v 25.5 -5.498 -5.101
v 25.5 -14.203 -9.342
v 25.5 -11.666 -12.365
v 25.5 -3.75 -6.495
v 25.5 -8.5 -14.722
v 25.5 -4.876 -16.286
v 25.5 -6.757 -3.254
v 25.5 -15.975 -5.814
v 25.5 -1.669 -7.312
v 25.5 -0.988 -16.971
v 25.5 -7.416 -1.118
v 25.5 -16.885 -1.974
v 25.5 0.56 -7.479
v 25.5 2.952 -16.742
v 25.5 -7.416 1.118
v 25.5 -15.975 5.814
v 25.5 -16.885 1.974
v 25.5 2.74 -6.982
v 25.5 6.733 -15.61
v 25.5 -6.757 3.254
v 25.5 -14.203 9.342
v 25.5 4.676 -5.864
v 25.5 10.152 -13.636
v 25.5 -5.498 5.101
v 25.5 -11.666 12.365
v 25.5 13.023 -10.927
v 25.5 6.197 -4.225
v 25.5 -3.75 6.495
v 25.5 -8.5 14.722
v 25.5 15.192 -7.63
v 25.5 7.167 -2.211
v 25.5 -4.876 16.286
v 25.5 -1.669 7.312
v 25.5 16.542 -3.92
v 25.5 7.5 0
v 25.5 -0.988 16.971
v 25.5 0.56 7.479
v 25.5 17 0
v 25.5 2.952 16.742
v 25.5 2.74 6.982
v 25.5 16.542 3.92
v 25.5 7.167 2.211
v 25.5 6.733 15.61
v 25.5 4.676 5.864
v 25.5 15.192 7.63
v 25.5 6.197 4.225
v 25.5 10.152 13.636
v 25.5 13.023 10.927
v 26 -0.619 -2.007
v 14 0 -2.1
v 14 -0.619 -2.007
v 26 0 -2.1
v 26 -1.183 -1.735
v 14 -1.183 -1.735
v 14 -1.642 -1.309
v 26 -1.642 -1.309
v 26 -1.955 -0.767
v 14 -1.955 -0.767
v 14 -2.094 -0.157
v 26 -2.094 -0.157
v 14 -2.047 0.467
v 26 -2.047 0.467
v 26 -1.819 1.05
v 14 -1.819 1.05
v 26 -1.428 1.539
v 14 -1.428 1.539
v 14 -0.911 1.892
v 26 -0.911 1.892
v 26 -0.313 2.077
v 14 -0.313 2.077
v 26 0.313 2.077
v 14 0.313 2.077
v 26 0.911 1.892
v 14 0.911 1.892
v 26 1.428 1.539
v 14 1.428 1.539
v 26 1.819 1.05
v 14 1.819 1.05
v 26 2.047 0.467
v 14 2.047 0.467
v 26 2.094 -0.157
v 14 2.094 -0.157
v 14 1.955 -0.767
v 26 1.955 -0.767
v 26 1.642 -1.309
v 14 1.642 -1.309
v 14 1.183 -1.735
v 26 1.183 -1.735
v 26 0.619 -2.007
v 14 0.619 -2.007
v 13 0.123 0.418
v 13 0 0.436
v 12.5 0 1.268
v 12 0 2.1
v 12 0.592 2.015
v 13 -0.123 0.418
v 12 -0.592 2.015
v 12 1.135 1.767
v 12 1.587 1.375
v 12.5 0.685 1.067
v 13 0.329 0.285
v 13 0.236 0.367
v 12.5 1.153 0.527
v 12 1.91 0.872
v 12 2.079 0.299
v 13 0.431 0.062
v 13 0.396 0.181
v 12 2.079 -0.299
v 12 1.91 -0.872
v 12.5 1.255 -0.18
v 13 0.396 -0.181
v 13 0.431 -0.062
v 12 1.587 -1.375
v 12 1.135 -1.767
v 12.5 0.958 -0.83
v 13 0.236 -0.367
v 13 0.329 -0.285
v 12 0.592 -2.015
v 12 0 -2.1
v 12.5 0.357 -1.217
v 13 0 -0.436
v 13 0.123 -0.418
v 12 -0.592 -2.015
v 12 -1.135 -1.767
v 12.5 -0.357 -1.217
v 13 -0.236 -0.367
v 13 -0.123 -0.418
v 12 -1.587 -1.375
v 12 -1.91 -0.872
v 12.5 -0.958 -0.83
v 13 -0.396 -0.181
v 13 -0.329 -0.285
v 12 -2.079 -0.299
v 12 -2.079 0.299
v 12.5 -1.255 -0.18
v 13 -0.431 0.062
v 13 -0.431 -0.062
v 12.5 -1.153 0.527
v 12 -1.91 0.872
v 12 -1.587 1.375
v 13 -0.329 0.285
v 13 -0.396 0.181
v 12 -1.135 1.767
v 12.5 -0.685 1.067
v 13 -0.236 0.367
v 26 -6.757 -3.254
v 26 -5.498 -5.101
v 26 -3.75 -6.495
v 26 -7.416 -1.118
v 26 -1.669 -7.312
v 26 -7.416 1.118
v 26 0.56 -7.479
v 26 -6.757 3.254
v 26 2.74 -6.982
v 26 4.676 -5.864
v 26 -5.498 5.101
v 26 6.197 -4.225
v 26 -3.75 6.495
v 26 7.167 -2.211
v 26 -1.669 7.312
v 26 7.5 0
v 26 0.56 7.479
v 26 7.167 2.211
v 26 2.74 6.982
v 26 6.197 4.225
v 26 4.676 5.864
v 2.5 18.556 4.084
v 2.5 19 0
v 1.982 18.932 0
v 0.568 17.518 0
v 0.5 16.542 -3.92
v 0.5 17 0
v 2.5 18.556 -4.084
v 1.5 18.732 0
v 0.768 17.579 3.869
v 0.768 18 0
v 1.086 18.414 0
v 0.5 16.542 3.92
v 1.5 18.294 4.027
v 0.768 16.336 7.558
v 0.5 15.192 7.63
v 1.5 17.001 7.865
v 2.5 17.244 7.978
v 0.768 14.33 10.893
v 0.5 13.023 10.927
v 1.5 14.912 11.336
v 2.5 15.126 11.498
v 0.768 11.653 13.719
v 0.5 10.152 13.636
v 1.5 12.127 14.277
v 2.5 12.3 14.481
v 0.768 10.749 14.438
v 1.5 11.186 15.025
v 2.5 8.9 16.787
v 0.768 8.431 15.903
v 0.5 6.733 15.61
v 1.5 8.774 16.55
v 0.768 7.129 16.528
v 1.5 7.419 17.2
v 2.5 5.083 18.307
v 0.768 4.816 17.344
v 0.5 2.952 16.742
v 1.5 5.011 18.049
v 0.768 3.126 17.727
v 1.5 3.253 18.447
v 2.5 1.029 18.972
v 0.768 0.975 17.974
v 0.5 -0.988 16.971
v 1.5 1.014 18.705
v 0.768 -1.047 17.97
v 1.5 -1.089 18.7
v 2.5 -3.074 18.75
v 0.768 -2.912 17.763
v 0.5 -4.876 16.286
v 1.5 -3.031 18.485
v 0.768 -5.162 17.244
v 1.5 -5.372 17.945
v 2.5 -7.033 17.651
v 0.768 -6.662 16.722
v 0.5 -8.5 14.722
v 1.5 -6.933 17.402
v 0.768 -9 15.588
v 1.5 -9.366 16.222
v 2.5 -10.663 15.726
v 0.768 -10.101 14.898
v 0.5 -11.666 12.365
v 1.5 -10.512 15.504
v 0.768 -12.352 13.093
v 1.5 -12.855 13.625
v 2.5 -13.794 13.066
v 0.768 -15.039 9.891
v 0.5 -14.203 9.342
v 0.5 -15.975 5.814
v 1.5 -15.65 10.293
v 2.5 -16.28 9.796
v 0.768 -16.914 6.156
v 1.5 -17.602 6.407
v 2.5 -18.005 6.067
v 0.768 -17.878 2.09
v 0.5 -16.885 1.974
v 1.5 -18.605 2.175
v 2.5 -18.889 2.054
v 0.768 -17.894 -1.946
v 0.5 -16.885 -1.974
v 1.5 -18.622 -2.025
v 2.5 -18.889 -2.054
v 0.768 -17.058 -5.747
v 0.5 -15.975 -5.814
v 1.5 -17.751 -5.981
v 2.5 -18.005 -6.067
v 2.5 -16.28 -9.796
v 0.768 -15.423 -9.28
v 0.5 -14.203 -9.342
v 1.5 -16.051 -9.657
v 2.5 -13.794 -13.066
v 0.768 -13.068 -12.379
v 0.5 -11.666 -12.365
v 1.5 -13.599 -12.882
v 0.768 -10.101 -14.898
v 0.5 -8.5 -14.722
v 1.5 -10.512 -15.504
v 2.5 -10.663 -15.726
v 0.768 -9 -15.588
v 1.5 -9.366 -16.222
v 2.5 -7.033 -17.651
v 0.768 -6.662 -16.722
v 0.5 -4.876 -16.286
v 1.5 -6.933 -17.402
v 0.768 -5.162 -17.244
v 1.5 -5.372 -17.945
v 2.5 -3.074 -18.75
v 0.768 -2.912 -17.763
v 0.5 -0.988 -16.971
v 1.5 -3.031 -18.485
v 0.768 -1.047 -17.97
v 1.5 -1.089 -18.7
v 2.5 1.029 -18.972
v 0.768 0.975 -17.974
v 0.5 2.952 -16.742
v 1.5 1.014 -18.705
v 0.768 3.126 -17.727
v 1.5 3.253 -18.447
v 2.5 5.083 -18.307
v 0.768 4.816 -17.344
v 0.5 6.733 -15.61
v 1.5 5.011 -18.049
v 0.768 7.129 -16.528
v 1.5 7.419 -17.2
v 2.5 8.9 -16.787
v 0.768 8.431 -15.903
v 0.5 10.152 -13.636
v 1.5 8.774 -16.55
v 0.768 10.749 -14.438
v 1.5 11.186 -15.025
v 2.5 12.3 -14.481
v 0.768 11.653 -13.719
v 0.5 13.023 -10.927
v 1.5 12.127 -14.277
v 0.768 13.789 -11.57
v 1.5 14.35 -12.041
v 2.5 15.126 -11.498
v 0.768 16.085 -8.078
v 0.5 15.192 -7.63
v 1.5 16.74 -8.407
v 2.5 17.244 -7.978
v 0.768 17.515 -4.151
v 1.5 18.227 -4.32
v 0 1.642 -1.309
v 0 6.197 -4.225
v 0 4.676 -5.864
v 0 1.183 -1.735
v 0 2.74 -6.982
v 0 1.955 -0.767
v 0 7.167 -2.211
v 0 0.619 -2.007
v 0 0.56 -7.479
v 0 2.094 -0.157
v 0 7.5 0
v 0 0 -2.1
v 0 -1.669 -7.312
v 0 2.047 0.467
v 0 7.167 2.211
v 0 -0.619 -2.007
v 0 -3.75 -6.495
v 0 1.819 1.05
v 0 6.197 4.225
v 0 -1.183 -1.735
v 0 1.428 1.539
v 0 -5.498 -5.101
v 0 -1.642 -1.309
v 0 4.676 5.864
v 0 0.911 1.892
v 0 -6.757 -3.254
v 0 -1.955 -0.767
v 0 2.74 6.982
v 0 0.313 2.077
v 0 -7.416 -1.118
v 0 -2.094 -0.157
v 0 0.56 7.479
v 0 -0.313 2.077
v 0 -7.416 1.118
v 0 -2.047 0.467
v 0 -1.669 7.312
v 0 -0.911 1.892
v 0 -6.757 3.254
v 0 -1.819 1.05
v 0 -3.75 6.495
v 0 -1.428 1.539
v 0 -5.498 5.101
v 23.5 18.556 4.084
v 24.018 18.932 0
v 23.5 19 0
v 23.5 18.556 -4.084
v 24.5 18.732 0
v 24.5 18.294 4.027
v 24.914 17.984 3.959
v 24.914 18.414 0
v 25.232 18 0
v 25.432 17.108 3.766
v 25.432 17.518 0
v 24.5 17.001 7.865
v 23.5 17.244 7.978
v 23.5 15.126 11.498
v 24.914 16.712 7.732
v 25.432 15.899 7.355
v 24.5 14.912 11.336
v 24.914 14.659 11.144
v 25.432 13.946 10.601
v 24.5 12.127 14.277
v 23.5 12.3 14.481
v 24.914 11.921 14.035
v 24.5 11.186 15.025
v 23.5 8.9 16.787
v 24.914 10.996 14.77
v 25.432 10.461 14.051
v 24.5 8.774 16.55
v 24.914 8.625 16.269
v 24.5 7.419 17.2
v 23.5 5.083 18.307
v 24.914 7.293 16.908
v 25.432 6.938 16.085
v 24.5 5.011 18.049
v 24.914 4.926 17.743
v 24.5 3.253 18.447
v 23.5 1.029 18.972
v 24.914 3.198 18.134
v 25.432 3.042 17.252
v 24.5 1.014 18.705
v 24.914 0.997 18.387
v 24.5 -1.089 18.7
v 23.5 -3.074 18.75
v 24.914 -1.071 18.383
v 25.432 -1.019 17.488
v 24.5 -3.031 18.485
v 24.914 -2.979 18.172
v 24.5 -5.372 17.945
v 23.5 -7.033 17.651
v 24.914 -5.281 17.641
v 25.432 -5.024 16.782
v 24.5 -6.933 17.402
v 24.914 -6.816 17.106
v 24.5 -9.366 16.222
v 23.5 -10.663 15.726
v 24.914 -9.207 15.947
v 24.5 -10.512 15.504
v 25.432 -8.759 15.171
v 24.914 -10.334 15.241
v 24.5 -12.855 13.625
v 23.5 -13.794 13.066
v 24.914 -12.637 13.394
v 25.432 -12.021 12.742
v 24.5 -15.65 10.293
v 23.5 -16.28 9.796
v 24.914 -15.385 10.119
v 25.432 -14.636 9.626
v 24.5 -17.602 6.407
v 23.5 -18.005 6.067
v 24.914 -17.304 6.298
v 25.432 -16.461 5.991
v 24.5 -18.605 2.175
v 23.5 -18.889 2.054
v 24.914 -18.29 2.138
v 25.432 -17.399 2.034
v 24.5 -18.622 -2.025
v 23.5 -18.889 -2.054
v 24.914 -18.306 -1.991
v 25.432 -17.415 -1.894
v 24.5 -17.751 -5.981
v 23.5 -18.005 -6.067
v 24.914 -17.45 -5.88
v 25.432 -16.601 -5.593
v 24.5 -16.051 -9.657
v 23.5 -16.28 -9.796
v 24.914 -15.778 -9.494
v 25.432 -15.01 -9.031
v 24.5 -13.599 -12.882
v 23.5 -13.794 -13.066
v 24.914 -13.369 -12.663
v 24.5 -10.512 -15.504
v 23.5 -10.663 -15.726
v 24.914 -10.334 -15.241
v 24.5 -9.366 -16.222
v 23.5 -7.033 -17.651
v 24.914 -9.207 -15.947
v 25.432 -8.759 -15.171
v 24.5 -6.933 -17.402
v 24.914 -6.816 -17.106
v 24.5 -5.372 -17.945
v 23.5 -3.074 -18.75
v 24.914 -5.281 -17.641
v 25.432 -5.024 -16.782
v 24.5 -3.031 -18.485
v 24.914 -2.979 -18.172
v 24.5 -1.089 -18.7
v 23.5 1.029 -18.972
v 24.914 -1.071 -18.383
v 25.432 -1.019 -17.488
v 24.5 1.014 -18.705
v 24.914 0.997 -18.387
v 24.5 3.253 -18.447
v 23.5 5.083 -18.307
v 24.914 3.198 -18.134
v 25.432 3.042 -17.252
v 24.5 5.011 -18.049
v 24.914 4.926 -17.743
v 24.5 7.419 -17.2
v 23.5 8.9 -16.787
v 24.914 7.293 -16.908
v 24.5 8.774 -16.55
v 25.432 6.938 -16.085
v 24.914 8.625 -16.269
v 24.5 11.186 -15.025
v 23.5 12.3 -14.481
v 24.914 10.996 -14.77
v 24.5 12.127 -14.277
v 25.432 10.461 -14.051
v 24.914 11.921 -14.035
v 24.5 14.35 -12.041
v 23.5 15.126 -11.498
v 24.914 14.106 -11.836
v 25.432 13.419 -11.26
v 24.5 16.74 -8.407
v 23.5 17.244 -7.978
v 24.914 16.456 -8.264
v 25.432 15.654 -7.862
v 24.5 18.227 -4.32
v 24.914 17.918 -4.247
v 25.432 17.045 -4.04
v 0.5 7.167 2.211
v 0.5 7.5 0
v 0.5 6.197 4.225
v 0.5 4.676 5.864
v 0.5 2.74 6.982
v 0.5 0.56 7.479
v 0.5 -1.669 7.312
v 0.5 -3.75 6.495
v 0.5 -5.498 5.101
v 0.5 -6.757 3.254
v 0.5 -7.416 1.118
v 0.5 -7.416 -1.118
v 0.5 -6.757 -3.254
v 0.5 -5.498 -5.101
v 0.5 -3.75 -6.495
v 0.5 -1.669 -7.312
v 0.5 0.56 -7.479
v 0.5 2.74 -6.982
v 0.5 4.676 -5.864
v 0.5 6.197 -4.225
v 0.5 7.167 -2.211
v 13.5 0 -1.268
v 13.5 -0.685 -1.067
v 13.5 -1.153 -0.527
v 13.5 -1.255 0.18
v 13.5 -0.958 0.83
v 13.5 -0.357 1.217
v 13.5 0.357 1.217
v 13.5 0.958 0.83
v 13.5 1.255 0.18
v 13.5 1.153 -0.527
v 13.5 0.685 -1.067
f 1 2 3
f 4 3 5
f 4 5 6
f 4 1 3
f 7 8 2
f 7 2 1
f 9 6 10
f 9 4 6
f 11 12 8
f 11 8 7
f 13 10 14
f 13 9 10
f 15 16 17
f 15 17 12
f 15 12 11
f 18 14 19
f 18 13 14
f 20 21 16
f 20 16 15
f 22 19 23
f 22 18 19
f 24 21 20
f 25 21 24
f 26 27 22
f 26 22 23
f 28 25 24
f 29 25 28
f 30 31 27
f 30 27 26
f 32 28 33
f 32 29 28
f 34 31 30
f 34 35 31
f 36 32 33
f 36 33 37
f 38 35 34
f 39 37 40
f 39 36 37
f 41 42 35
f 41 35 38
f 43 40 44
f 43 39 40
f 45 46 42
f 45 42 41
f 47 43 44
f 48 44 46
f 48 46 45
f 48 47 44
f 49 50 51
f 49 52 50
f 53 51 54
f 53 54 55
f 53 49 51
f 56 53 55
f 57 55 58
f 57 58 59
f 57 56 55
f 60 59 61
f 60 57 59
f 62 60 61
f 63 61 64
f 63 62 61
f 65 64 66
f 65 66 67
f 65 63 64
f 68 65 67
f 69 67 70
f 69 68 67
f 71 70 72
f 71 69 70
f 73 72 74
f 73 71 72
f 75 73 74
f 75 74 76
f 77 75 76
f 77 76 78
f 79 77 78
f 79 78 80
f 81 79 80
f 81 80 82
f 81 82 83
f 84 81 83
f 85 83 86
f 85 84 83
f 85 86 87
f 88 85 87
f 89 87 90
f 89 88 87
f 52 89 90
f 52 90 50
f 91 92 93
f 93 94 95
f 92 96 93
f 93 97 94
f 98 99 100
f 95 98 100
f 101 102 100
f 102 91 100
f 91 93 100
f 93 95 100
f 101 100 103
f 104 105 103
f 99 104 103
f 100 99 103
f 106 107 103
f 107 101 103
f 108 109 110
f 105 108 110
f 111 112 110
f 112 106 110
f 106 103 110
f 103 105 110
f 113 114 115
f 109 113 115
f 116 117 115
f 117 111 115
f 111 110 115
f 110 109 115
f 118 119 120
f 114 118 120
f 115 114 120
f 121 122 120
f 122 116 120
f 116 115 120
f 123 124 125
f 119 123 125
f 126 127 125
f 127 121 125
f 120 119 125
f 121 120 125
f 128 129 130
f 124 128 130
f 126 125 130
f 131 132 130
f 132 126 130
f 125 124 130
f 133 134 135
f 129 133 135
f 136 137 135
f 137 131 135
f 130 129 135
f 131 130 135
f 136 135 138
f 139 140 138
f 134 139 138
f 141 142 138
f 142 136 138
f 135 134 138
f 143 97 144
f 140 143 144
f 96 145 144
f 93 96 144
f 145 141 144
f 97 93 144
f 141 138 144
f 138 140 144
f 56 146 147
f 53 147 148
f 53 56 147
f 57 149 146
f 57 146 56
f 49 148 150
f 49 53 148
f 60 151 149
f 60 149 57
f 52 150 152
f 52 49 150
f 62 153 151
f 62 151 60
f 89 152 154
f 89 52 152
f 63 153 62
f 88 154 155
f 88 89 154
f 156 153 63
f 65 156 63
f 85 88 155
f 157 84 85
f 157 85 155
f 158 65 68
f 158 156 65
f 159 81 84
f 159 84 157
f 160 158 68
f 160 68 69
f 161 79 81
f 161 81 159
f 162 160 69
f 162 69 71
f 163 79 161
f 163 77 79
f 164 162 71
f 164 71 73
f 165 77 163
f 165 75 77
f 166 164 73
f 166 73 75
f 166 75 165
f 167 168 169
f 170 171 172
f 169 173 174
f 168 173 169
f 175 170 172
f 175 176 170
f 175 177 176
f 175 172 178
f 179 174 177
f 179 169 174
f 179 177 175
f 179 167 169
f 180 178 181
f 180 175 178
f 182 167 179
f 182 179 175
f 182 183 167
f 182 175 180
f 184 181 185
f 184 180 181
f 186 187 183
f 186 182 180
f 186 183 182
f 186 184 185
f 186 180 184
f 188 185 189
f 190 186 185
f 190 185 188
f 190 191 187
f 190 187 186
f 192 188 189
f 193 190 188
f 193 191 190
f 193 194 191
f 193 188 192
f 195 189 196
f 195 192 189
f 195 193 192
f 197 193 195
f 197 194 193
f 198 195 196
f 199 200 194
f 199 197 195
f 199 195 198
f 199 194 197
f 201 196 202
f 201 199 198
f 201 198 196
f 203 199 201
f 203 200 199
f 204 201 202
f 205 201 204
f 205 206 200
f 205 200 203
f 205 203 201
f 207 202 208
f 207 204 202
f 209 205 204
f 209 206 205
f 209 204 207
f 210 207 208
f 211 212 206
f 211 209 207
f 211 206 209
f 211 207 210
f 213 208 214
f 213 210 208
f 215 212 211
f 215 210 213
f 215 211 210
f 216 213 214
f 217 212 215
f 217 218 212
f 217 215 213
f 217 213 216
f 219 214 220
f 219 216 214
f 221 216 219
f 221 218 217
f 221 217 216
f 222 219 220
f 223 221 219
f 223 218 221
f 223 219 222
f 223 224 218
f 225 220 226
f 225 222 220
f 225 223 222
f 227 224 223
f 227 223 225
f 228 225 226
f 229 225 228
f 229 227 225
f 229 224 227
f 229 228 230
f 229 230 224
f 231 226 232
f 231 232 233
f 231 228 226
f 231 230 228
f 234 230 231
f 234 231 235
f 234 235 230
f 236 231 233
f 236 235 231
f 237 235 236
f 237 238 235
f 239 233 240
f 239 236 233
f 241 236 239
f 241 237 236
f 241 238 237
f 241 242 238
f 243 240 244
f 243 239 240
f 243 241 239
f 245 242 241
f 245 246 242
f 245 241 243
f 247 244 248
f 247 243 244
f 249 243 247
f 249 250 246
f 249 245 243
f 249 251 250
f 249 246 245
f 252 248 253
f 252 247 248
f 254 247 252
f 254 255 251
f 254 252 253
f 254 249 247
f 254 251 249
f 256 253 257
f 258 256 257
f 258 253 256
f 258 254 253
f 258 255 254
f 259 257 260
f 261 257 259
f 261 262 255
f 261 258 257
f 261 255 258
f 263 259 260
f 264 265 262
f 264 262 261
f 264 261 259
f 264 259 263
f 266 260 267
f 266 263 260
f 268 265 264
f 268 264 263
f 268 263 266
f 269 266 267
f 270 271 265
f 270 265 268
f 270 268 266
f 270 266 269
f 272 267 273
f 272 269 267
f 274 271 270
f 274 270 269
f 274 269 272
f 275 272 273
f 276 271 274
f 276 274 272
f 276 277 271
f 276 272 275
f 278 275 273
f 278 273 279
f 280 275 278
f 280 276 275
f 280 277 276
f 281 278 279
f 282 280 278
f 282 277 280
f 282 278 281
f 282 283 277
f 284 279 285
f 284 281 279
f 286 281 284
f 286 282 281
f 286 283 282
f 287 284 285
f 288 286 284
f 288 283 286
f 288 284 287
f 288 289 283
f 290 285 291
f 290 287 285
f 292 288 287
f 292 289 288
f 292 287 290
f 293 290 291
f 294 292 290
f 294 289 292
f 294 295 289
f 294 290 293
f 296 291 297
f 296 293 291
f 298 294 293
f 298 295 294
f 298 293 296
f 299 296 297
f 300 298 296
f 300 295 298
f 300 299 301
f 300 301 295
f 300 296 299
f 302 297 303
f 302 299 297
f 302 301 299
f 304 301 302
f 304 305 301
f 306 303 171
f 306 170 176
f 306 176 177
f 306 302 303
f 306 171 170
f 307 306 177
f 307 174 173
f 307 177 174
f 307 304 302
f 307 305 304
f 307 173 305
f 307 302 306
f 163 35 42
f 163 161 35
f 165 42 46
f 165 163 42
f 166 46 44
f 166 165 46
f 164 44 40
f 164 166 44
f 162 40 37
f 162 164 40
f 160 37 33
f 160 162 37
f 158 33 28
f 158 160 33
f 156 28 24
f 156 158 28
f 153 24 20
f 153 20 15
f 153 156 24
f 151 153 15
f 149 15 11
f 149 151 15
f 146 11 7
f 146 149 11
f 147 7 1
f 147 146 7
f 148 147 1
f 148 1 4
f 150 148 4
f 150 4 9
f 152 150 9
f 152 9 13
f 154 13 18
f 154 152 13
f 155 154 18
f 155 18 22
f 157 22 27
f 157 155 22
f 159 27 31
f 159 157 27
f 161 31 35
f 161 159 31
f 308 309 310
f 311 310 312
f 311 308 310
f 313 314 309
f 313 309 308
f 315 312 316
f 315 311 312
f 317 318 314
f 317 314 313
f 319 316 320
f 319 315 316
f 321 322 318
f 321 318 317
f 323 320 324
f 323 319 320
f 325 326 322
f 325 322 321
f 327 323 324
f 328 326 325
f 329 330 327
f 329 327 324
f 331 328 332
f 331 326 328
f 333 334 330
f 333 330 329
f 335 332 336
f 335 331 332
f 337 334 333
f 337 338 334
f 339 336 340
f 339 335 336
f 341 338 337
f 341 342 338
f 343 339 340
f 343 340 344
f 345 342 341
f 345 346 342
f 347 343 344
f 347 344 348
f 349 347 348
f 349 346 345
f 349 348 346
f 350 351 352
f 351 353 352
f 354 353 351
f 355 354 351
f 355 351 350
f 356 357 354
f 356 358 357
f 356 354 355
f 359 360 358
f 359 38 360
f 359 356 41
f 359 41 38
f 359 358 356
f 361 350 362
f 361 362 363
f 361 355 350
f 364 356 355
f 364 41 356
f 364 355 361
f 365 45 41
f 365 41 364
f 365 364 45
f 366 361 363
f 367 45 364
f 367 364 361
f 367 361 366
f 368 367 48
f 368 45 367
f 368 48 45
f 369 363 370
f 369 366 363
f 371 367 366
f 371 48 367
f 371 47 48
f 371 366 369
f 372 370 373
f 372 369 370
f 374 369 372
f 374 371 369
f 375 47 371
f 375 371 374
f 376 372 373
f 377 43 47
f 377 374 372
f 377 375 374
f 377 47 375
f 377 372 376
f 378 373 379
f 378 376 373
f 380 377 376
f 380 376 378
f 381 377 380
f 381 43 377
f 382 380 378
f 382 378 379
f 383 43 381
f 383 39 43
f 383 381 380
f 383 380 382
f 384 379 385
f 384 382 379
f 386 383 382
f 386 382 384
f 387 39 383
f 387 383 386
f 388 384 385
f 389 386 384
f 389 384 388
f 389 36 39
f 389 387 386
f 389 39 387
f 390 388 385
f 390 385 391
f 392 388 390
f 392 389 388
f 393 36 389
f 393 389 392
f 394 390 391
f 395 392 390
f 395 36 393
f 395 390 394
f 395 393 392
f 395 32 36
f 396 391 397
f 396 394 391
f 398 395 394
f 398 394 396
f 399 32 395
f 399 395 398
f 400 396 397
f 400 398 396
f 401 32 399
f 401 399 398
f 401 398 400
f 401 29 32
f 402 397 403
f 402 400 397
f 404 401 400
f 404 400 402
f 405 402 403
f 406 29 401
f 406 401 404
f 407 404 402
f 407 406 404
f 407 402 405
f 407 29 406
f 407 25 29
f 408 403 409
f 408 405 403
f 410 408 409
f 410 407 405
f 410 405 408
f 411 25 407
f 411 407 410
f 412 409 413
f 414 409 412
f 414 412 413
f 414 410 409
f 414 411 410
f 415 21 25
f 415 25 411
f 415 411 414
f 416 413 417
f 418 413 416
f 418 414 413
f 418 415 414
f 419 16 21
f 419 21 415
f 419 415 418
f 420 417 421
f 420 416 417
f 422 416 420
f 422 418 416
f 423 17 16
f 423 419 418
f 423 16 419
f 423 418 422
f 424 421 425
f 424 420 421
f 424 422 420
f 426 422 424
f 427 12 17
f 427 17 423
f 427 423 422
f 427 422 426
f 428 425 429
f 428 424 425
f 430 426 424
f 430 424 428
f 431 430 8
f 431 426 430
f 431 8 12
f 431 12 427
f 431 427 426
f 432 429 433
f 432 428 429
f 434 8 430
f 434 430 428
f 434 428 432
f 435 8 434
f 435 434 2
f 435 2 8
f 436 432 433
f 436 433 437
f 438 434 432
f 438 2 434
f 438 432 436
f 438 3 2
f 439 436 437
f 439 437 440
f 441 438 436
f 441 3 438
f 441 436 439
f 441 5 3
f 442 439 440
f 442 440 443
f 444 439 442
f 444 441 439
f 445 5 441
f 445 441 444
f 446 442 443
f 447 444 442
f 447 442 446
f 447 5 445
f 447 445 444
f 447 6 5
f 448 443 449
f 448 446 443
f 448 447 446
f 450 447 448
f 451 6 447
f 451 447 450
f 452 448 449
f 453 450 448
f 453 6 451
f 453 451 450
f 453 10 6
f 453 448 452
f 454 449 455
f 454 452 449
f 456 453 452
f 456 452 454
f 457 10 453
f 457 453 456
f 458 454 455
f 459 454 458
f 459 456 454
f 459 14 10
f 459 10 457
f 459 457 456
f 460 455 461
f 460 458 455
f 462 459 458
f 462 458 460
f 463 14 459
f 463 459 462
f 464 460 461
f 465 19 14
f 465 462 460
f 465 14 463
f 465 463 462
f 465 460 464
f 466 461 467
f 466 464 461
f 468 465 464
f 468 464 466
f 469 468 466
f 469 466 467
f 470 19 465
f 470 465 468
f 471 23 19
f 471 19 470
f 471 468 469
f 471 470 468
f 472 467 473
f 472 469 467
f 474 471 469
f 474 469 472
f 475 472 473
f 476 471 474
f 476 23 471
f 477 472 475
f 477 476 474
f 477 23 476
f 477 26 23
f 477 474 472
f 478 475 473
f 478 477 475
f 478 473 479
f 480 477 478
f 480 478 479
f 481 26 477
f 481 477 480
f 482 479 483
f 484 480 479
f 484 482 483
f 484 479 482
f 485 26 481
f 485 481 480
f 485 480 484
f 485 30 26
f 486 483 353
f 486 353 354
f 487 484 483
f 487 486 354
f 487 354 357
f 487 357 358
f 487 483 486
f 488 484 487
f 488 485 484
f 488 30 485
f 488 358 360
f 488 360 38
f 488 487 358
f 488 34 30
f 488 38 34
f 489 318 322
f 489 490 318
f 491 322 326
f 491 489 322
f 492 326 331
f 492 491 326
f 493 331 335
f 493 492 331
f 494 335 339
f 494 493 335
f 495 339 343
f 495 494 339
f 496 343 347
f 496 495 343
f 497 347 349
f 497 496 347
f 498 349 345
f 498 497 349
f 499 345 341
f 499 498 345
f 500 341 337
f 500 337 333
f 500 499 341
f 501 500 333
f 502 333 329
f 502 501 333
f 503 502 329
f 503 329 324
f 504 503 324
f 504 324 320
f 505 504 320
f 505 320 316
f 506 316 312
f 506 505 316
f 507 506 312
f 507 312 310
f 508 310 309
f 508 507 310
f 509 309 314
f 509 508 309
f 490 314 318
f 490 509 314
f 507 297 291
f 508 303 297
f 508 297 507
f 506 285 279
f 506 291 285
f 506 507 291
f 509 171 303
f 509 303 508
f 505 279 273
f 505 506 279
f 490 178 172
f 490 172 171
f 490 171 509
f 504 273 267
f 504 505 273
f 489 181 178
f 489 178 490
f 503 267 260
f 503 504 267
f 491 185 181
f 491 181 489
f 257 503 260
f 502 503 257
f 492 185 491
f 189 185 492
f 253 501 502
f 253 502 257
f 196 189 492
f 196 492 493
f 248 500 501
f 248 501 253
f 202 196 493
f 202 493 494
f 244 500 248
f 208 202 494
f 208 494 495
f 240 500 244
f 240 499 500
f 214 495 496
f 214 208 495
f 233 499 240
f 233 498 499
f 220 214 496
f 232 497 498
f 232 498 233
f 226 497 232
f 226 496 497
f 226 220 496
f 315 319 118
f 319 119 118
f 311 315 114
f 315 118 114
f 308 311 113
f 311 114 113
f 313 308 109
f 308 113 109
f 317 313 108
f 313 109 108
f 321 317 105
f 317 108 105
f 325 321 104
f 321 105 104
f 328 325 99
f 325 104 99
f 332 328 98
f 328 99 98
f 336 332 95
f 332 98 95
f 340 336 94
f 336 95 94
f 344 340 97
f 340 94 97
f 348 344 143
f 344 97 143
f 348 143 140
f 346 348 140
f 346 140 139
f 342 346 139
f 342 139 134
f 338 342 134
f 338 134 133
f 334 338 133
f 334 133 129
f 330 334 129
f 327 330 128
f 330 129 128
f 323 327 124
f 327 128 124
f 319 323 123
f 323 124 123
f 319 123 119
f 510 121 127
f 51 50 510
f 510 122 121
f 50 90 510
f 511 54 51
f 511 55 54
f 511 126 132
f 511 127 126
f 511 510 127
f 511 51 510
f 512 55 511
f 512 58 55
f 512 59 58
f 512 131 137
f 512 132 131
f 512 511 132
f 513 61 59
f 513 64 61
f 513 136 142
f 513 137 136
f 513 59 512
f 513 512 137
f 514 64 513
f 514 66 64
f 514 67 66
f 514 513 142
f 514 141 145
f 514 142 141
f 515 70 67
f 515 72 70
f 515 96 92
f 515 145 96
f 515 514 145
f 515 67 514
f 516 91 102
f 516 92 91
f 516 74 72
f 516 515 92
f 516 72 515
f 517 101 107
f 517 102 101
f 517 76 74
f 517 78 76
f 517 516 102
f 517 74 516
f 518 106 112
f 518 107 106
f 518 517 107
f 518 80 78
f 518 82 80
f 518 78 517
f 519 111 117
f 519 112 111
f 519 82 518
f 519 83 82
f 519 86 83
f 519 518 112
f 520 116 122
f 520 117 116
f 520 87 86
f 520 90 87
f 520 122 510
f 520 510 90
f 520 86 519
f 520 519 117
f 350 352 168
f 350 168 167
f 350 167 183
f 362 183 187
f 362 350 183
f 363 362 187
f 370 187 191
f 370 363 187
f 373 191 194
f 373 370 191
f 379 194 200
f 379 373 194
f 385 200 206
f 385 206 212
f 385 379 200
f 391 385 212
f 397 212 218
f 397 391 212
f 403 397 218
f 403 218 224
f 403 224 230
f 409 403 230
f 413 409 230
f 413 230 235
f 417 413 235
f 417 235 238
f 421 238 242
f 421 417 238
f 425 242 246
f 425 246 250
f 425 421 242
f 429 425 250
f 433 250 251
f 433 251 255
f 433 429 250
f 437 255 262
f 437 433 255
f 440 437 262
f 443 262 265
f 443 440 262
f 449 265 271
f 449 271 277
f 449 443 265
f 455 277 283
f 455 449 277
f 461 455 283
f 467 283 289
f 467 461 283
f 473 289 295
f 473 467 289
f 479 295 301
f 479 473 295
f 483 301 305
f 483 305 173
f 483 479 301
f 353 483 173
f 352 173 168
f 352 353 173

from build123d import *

# Parameters (mm, degrees)
M5_GEWINDEBOHRUNG2_D     = 4.2
M5_GEWINDEBOHRUNG2_DEPTH = 12
M5_GEWINDEBOHRUNG2_TIP   = 1.2618073
VERRUNDUNG1_R            = 2


with BuildPart() as part:
    # Skizze1 → Rotation1 (revolve)
    with BuildSketch(Plane.XY):
        Polygon((0, 0), (0, 7.5), (0.5, 7.5), (0.5, 19), (25.5, 19), (25.5, 7.5), (26, 7.5), (26, 0), align=None)
    revolve(axis=Axis((0, 0, 0), (1, 0, 0)))

    # Skizze2 → M5 Gewindebohrung1 (revolve, cut)
    with BuildSketch(Plane(origin=(26, 0, 0), x_dir=(0, 0, -1), z_dir=(0, 1, 0))):
        Polygon((0, 0), (0, 13.2618073), (2.1, 12), (2.1, 0), align=None)
    revolve(axis=Axis((32.35, 0, 0), (-1, 0, 0)), mode=Mode.SUBTRACT)

    # M5 Gewindebohrung2
    with Locations(Plane.ZY):
        with Locations((0, 0)):
            Hole(M5_GEWINDEBOHRUNG2_D / 2, depth=M5_GEWINDEBOHRUNG2_DEPTH)
            with Locations((0, 0, -(M5_GEWINDEBOHRUNG2_DEPTH + M5_GEWINDEBOHRUNG2_TIP / 2))):  # 118° drill point
                Cone(0, M5_GEWINDEBOHRUNG2_D / 2, M5_GEWINDEBOHRUNG2_TIP, mode=Mode.SUBTRACT)

    # Verrundung1
    verrundung1_edges = [part.edges().sort_by_distance(p)[0] for p in [
        (0.5, -19, 0),
        (25.5, -19, 0),
    ]]
    fillet(verrundung1_edges, radius=VERRUNDUNG1_R)


solid = part.part
